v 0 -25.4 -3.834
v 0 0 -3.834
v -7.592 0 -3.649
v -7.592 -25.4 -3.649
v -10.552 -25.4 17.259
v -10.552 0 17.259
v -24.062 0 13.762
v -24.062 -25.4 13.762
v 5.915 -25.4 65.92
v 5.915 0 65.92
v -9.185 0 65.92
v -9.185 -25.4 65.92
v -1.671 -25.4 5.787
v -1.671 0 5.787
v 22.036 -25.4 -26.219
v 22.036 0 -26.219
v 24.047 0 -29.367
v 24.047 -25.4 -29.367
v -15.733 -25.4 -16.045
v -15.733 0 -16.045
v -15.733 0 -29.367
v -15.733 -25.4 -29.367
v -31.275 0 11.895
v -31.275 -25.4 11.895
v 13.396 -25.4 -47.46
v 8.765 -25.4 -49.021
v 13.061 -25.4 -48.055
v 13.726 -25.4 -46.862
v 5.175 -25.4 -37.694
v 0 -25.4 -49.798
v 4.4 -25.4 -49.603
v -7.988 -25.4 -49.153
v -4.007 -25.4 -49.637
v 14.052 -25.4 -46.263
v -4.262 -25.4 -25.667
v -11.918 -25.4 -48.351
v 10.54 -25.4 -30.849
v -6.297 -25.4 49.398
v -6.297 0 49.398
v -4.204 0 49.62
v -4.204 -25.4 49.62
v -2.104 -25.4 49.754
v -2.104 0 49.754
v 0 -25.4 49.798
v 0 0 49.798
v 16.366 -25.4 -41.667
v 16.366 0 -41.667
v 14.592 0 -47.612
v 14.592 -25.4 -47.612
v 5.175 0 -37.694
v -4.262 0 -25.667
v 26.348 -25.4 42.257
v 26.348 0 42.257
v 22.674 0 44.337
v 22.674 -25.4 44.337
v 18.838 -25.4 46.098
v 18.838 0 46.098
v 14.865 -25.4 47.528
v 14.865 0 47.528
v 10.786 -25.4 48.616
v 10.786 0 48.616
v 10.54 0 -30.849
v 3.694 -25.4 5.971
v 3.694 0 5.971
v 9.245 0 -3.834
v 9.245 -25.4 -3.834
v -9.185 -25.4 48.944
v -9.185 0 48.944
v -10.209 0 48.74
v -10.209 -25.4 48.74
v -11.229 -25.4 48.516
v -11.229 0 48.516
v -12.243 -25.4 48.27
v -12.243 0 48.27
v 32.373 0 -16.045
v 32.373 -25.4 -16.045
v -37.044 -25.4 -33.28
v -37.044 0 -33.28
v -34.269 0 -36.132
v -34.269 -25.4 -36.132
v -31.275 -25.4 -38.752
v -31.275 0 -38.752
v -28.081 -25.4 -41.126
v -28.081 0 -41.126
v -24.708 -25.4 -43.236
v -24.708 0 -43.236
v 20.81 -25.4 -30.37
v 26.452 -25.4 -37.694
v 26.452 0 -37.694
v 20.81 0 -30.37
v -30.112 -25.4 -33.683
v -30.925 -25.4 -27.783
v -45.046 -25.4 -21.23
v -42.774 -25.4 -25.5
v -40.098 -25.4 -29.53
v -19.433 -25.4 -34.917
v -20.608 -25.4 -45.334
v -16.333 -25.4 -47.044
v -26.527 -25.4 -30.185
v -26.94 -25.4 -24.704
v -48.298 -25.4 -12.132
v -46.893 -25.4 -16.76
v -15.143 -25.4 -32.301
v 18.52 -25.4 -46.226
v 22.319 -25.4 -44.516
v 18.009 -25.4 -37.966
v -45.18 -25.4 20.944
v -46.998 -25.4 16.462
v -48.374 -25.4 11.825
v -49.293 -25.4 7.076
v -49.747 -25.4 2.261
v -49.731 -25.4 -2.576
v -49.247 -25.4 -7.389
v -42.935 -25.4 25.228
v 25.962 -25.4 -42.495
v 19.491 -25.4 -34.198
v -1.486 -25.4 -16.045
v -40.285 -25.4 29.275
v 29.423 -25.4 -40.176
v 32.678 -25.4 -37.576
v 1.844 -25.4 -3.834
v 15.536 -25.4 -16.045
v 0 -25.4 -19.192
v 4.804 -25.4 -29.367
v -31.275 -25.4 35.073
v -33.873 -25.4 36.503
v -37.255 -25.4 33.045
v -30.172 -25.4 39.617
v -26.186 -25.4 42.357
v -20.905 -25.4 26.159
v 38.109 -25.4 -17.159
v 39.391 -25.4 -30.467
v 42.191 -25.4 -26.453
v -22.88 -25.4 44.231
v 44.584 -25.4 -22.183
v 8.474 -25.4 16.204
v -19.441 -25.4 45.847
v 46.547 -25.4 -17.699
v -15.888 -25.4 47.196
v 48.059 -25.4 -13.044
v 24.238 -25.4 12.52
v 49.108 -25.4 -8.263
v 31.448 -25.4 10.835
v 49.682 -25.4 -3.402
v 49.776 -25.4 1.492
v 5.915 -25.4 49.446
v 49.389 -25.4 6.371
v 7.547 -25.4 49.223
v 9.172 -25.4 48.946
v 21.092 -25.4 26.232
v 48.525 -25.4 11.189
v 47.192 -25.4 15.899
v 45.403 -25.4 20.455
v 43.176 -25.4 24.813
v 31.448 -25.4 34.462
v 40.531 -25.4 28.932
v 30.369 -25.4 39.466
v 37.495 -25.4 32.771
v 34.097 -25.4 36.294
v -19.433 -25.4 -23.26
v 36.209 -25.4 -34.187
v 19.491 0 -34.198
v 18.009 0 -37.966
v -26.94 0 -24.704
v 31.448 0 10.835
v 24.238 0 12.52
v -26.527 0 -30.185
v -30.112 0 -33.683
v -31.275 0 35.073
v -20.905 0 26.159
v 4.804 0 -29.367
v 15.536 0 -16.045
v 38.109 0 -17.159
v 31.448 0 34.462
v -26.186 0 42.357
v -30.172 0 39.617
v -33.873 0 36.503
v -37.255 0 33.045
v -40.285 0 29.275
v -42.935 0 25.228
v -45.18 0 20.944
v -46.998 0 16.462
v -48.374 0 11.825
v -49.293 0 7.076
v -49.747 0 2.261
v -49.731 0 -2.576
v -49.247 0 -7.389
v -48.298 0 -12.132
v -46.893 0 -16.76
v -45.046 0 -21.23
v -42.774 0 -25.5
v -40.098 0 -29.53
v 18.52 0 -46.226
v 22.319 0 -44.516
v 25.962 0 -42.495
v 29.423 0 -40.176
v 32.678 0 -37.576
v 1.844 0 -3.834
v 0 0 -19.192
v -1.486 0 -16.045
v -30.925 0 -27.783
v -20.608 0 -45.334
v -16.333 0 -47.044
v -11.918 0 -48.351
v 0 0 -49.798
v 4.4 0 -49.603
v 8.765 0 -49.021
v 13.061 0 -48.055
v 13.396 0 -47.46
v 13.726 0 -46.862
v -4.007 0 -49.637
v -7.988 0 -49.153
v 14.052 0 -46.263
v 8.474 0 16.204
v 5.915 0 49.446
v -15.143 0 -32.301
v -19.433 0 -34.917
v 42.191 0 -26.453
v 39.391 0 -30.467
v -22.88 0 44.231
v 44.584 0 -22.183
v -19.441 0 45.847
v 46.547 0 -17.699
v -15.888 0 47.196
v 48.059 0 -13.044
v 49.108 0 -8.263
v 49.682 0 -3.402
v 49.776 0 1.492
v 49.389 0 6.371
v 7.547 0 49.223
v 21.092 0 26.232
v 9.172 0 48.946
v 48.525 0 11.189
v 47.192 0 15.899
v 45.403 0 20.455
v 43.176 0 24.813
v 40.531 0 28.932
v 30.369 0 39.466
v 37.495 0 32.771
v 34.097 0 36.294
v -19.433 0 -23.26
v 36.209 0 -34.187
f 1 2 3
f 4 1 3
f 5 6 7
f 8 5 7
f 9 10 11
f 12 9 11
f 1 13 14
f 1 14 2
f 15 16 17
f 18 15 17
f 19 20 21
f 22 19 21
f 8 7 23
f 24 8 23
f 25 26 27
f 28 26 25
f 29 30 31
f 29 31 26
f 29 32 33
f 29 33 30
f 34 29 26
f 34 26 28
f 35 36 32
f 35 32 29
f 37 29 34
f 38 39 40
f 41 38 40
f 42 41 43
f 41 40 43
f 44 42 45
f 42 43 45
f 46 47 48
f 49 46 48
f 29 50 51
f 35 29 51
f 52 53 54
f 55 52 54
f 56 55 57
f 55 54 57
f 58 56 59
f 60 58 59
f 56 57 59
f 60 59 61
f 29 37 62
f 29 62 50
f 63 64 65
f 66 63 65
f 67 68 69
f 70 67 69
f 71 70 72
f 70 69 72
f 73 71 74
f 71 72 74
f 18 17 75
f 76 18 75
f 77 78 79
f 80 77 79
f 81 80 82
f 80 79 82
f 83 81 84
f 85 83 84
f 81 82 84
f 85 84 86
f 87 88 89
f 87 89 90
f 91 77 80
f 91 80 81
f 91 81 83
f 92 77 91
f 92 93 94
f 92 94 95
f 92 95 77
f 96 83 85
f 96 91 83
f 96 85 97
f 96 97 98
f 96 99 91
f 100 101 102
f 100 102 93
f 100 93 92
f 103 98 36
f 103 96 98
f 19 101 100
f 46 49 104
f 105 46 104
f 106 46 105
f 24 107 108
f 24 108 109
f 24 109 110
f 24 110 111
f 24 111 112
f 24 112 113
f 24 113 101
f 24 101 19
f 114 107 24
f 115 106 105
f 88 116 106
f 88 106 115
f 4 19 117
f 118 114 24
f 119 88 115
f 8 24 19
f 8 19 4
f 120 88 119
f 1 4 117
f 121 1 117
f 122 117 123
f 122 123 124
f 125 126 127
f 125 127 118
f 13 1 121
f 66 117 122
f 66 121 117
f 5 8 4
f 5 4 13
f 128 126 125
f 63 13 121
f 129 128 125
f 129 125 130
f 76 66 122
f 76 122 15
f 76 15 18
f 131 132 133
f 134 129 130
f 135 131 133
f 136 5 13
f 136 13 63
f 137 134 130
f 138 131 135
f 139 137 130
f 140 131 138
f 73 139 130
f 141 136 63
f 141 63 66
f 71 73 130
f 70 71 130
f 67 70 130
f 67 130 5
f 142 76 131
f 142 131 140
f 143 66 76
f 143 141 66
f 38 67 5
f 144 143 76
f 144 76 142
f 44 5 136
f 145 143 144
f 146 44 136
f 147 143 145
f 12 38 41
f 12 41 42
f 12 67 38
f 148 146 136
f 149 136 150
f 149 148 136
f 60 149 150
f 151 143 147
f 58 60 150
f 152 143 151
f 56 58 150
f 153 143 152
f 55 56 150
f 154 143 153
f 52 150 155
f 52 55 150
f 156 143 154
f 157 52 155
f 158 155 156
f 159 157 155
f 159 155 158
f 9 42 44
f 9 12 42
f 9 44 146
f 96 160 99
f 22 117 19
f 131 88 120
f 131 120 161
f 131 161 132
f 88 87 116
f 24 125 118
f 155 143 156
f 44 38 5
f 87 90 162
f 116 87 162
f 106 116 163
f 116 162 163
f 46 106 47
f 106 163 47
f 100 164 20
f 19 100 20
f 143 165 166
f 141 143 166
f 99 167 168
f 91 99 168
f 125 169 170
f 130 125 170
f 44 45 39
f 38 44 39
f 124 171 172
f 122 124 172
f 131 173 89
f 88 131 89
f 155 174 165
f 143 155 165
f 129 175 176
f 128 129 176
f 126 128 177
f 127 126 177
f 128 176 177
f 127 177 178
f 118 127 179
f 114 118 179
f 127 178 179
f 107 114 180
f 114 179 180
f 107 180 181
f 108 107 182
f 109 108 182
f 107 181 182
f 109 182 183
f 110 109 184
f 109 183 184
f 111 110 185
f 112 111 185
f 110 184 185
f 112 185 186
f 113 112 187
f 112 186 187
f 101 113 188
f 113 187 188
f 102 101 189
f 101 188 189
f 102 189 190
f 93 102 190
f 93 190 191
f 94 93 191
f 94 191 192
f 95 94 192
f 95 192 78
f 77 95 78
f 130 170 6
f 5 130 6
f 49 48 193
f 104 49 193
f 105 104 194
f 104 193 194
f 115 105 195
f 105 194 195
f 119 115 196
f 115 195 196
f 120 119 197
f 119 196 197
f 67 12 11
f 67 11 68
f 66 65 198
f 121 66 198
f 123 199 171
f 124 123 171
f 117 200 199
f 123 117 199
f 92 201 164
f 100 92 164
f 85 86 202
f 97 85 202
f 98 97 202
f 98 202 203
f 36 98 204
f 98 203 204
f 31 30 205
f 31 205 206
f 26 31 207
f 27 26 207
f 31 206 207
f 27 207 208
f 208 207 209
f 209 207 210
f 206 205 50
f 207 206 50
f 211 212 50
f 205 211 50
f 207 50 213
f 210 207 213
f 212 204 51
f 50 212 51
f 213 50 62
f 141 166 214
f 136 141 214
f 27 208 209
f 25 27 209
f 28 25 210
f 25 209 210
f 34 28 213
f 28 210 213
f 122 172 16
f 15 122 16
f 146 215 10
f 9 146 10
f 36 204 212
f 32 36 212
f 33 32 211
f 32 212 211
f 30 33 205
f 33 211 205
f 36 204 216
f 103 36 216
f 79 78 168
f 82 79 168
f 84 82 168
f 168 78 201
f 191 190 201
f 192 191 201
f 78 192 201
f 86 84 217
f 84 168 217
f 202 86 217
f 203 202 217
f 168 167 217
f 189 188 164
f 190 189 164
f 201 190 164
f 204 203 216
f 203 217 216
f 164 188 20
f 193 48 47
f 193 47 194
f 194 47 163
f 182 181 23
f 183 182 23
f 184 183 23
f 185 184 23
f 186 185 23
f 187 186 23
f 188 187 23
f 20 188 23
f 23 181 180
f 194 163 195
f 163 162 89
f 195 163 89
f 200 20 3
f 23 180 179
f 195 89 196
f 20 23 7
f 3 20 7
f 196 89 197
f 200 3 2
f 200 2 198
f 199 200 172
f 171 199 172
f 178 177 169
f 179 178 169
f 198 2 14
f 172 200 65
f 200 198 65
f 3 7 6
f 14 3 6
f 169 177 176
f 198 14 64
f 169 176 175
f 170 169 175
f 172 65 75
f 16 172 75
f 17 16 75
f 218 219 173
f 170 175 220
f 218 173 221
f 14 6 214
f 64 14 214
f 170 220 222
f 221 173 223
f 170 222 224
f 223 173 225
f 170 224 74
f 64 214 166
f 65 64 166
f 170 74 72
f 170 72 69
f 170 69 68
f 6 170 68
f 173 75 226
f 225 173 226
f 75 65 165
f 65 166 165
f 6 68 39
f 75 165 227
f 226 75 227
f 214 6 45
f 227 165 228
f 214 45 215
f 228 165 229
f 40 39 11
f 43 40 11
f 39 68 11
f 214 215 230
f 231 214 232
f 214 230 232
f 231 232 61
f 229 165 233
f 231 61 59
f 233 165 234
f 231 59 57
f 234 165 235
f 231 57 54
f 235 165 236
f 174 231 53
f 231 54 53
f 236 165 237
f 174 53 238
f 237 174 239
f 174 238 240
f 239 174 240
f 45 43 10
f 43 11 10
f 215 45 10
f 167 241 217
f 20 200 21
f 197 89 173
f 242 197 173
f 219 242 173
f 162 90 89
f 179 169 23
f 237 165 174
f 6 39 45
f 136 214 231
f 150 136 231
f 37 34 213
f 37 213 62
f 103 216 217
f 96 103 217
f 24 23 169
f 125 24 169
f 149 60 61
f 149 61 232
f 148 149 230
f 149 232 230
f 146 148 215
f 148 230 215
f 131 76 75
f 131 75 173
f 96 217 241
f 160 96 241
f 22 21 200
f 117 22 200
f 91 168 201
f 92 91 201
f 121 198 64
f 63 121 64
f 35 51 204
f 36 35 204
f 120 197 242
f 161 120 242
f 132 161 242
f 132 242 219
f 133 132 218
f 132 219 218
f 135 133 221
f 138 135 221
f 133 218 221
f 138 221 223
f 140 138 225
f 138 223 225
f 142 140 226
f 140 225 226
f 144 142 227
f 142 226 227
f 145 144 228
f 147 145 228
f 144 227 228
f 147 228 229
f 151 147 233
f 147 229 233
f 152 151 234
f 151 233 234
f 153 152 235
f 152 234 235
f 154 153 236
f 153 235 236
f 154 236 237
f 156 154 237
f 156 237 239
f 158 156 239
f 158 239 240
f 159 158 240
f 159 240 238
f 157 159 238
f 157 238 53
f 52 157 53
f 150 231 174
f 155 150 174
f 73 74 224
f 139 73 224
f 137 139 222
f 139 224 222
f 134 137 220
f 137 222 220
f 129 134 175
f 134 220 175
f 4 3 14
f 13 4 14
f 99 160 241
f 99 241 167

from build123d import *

# Parameters (mm, degrees)
F1_DEPTH = 25.4


with BuildPart() as f1:
    # F0 (on Front) → F1 (new body)
    with BuildSketch(Plane.XZ):
        with BuildLine():
            ThreePointArc((32.6782151723, -37.5764677752), (45.3165071723, -20.6463278819), (49.7981593767, 0))
            ThreePointArc((49.7981593767, 0), (43.5428138182, 24.1636098732), (26.3482949877, 42.2566447857))
            ThreePointArc((26.3482949877, 42.2566447857), (42.3711325354, 3.3595819889), (32.6782151723, -37.5764677752))
        make_face()
        with BuildLine():
            ThreePointArc((32.6782151723, -37.5764677752), (42.3711325354, 3.3595819889), (26.3482949877, 42.2566447857))
            ThreePointArc((26.3482949877, 42.2566447857), (18.8375502119, 46.0977589403), (10.7862166768, 48.6159871555))
            ThreePointArc((10.7862166768, 48.6159871555), (16.6744949948, 37.7627754895), (21.092116807, 26.232439738))
            Line((21.092116807, 26.232439738), (31.447738409, 34.4624482095))
            Line((31.447738409, 34.4624482095), (31.447738409, 10.8348272407))
            Line((31.447738409, 10.8348272407), (24.2378107652, 12.519994233))
            ThreePointArc((24.2378107652, 12.519994233), (25.1538459711, -6.9642629039), (22.0360332318, -26.2192529167))
            Line((22.0360332318, -26.2192529167), (24.0468364209, -29.366614297))
            Line((24.0468364209, -29.366614297), (32.37285465, -16.0449128598))
            Line((32.37285465, -16.0449128598), (38.1085574627, -17.1593967825))
            Line((38.1085574627, -17.1593967825), (26.4521297067, -37.6942455769))
            Line((26.4521297067, -37.6942455769), (20.8098572617, -30.369653677))
            ThreePointArc((20.8098572617, -30.369653677), (18.7701982142, -36.0902111883), (16.3660323787, -41.6673945191))
            Line((16.3660323787, -41.6673945191), (14.5917575654, -47.6123648694))
            ThreePointArc((14.5917575654, -47.6123648694), (24.1617960482, -43.5438203311), (32.6782151723, -37.5764677752))
        make_face()
        with BuildLine():
            ThreePointArc((21.092116807, 26.232439738), (16.6744949948, 37.7627754895), (10.7862166768, 48.6159871555))
            ThreePointArc((10.7862166768, 48.6159871555), (8.3607166752, 49.0912934642), (5.9146205895, 49.4456665502))
            ThreePointArc((5.9146205895, 49.4456665502), (2.9625575062, 49.70995806), (0, 49.7981593767))
            Line((0, 49.7981593767), (0, -3.8344066124))
            Line((0, -3.8344066124), (0, -19.1923552025))
            Line((0, -19.1923552025), (4.8044845462, -29.366614297))
            Line((4.8044845462, -29.366614297), (15.5357960612, -16.0449128598))
            Line((15.5357960612, -16.0449128598), (22.0360332318, -26.2192529167))
            ThreePointArc((22.0360332318, -26.2192529167), (25.1538459711, -6.9642629039), (24.2378107652, 12.519994233))
            Line((24.2378107652, 12.519994233), (8.4741063403, 16.204424325))
            Line((8.4741063403, 16.204424325), (21.092116807, 26.232439738))
        make_face()
        Polygon((9.245027788, -3.8344066124), (1.8441228895, -3.8344066124), (3.6943492014, 5.9712096117), align=None, mode=Mode.SUBTRACT)
        with BuildLine():
            ThreePointArc((0, 49.7981593767), (2.9625575062, 49.70995806), (5.9146205895, 49.4456665502))
            Line((5.9146205895, 49.4456665502), (5.9146205895, 65.9195636089))
            Line((5.9146205895, 65.9195636089), (3.1392811798, 65.9195636089))
            Line((3.1392811798, 65.9195636089), (0, 65.9195636089))
            Line((0, 65.9195636089), (0, 49.7981593767))
        make_face()
        with BuildLine():
            Line((0, -3.8344066124), (0, 49.7981593767))
            Line((0, 49.7981593767), (-6.296872627, 49.398442004))
            ThreePointArc((-6.296872627, 49.398442004), (-7.744154843, 49.1923240259), (-9.1847632403, 48.9438126991))
            ThreePointArc((-9.1847632403, 48.9438126991), (-10.7192794325, 48.6307898944), (-12.2431936307, 48.2696683957))
            ThreePointArc((-12.2431936307, 48.2696683957), (-17.0201913462, 37.3889257354), (-20.9051760668, 26.1587359893))
            Line((-20.9051760668, 26.1587359893), (-10.5523923412, 17.2587409616))
            Line((-10.5523923412, 17.2587409616), (-24.0617127081, 13.7618819272))
            ThreePointArc((-24.0617127081, 13.7618819272), (-26.7647104228, -5.37655391), (-26.9402397571, -24.7041277979))
            Line((-26.9402397571, -24.7041277979), (-15.7330241054, -16.0449128598))
            Line((-15.7330241054, -16.0449128598), (-15.7330241054, -29.366614297))
            Line((-15.7330241054, -29.366614297), (-1.4862839598, -16.0449128598))
            Line((-1.4862839598, -16.0449128598), (0, -19.1923552025))
            Line((0, -19.1923552025), (0, -3.8344066124))
        make_face()
        Polygon((-1.6713063233, 5.7866196148), (0, -3.8344066124), (-7.5920294039, -3.6490550265), align=None, mode=Mode.SUBTRACT)
        with BuildLine():
            ThreePointArc((-6.296872627, 49.398442004), (-3.1547733222, 49.6981295683), (0, 49.7981593767))
            Line((0, 49.7981593767), (0, 65.9195636089))
            Line((0, 65.9195636089), (-3.1484363135, 65.9195636089))
            Line((-3.1484363135, 65.9195636089), (-6.296872627, 65.9195636089))
            Line((-6.296872627, 65.9195636089), (-6.296872627, 49.398442004))
        make_face()
        with BuildLine():
            ThreePointArc((-9.1847632403, 48.9438126991), (-7.744154843, 49.1923240259), (-6.296872627, 49.398442004))
            Line((-6.296872627, 49.398442004), (-6.296872627, 65.9195636089))
            Line((-6.296872627, 65.9195636089), (-9.1847632403, 65.9195636089))
            Line((-9.1847632403, 65.9195636089), (-9.1847632403, 48.9438126991))
        make_face()
        with BuildLine():
            ThreePointArc((-24.7076516572, -43.2364270829), (-18.4904087752, -46.2380953396), (-11.9177707221, -48.3510436115))
            Line((-11.9177707221, -48.3510436115), (-15.1432544542, -32.3012661093))
            Line((-15.1432544542, -32.3012661093), (-19.4334760308, -34.9169038236))
            Line((-19.4334760308, -34.9169038236), (-19.4334760308, -23.2604946941))
            Line((-19.4334760308, -23.2604946941), (-26.5274317789, -30.1849724934))
            ThreePointArc((-26.5274317789, -30.1849724934), (-25.7634681206, -36.7310464832), (-24.7076516572, -43.2364270829))
        make_face()
        with BuildLine():
            ThreePointArc((-20.9051760668, 26.1587359893), (-17.0201913462, 37.3889257354), (-12.2431936307, 48.2696683957))
            ThreePointArc((-12.2431936307, 48.2696683957), (-19.4406831361, 45.8466630902), (-26.1860345343, 42.3573874628))
            ThreePointArc((-26.1860345343, 42.3573874628), (-41.8830905525, 6.0124933669), (-37.0441602385, -33.2804277246))
            ThreePointArc((-37.0441602385, -33.2804277246), (-31.2746230818, -38.7524789968), (-24.7076516572, -43.2364270829))
            ThreePointArc((-24.7076516572, -43.2364270829), (-25.7634681206, -36.7310464832), (-26.5274317789, -30.1849724934))
            Line((-26.5274317789, -30.1849724934), (-30.1115038325, -33.6834193751))
            Line((-30.1115038325, -33.6834193751), (-30.925318067, -27.7831842472))
            Line((-30.925318067, -27.7831842472), (-26.9402397571, -24.7041277979))
            ThreePointArc((-26.9402397571, -24.7041277979), (-26.7647104228, -5.37655391), (-24.0617127081, 13.7618819272))
            Line((-24.0617127081, 13.7618819272), (-31.2749259174, 11.8947569281))
            Line((-31.2749259174, 11.8947569281), (-31.2749259174, 35.0733163144))
            Line((-31.2749259174, 35.0733163144), (-20.9051760668, 26.1587359893))
        make_face()
        with BuildLine():
            ThreePointArc((-37.0441602385, -33.2804277246), (-41.8830905525, 6.0124933669), (-26.1860345343, 42.3573874628))
            ThreePointArc((-26.1860345343, 42.3573874628), (-49.292840802, 7.0761941024), (-37.0441602385, -33.2804277246))
        make_face()
    extrude(amount=F1_DEPTH)


with BuildPart() as f1b:
    # F0 (on Front) → F1, piece 2 (new body)
    with BuildSketch(Plane.XZ):
        with BuildLine():
            ThreePointArc((0, -49.7981593767), (6.5886259942, -49.3603756551), (13.0614086221, -48.0547217463))
            ThreePointArc((13.0614086221, -48.0547217463), (13.5613311897, -47.1614128137), (14.0515134569, -46.2627222288))
            Line((14.0515134569, -46.2627222288), (10.5401859619, -30.8488430455))
            Line((10.5401859619, -30.8488430455), (5.1745297387, -37.6942455769))
            Line((5.1745297387, -37.6942455769), (0, -31.0988395126))
            Line((0, -31.0988395126), (0, -49.7981593767))
        make_face()
        with BuildLine():
            ThreePointArc((-11.9177707221, -48.3510436115), (-6.0026536428, -49.4350566557), (0, -49.7981593767))
            Line((0, -49.7981593767), (0, -31.0988395126))
            Line((0, -31.0988395126), (-4.2616231367, -25.6670154631))
            Line((-4.2616231367, -25.6670154631), (-11.9177707221, -48.3510436115))
        make_face()
    extrude(amount=F1_DEPTH)


solid = Compound([f1.part, f1b.part])
